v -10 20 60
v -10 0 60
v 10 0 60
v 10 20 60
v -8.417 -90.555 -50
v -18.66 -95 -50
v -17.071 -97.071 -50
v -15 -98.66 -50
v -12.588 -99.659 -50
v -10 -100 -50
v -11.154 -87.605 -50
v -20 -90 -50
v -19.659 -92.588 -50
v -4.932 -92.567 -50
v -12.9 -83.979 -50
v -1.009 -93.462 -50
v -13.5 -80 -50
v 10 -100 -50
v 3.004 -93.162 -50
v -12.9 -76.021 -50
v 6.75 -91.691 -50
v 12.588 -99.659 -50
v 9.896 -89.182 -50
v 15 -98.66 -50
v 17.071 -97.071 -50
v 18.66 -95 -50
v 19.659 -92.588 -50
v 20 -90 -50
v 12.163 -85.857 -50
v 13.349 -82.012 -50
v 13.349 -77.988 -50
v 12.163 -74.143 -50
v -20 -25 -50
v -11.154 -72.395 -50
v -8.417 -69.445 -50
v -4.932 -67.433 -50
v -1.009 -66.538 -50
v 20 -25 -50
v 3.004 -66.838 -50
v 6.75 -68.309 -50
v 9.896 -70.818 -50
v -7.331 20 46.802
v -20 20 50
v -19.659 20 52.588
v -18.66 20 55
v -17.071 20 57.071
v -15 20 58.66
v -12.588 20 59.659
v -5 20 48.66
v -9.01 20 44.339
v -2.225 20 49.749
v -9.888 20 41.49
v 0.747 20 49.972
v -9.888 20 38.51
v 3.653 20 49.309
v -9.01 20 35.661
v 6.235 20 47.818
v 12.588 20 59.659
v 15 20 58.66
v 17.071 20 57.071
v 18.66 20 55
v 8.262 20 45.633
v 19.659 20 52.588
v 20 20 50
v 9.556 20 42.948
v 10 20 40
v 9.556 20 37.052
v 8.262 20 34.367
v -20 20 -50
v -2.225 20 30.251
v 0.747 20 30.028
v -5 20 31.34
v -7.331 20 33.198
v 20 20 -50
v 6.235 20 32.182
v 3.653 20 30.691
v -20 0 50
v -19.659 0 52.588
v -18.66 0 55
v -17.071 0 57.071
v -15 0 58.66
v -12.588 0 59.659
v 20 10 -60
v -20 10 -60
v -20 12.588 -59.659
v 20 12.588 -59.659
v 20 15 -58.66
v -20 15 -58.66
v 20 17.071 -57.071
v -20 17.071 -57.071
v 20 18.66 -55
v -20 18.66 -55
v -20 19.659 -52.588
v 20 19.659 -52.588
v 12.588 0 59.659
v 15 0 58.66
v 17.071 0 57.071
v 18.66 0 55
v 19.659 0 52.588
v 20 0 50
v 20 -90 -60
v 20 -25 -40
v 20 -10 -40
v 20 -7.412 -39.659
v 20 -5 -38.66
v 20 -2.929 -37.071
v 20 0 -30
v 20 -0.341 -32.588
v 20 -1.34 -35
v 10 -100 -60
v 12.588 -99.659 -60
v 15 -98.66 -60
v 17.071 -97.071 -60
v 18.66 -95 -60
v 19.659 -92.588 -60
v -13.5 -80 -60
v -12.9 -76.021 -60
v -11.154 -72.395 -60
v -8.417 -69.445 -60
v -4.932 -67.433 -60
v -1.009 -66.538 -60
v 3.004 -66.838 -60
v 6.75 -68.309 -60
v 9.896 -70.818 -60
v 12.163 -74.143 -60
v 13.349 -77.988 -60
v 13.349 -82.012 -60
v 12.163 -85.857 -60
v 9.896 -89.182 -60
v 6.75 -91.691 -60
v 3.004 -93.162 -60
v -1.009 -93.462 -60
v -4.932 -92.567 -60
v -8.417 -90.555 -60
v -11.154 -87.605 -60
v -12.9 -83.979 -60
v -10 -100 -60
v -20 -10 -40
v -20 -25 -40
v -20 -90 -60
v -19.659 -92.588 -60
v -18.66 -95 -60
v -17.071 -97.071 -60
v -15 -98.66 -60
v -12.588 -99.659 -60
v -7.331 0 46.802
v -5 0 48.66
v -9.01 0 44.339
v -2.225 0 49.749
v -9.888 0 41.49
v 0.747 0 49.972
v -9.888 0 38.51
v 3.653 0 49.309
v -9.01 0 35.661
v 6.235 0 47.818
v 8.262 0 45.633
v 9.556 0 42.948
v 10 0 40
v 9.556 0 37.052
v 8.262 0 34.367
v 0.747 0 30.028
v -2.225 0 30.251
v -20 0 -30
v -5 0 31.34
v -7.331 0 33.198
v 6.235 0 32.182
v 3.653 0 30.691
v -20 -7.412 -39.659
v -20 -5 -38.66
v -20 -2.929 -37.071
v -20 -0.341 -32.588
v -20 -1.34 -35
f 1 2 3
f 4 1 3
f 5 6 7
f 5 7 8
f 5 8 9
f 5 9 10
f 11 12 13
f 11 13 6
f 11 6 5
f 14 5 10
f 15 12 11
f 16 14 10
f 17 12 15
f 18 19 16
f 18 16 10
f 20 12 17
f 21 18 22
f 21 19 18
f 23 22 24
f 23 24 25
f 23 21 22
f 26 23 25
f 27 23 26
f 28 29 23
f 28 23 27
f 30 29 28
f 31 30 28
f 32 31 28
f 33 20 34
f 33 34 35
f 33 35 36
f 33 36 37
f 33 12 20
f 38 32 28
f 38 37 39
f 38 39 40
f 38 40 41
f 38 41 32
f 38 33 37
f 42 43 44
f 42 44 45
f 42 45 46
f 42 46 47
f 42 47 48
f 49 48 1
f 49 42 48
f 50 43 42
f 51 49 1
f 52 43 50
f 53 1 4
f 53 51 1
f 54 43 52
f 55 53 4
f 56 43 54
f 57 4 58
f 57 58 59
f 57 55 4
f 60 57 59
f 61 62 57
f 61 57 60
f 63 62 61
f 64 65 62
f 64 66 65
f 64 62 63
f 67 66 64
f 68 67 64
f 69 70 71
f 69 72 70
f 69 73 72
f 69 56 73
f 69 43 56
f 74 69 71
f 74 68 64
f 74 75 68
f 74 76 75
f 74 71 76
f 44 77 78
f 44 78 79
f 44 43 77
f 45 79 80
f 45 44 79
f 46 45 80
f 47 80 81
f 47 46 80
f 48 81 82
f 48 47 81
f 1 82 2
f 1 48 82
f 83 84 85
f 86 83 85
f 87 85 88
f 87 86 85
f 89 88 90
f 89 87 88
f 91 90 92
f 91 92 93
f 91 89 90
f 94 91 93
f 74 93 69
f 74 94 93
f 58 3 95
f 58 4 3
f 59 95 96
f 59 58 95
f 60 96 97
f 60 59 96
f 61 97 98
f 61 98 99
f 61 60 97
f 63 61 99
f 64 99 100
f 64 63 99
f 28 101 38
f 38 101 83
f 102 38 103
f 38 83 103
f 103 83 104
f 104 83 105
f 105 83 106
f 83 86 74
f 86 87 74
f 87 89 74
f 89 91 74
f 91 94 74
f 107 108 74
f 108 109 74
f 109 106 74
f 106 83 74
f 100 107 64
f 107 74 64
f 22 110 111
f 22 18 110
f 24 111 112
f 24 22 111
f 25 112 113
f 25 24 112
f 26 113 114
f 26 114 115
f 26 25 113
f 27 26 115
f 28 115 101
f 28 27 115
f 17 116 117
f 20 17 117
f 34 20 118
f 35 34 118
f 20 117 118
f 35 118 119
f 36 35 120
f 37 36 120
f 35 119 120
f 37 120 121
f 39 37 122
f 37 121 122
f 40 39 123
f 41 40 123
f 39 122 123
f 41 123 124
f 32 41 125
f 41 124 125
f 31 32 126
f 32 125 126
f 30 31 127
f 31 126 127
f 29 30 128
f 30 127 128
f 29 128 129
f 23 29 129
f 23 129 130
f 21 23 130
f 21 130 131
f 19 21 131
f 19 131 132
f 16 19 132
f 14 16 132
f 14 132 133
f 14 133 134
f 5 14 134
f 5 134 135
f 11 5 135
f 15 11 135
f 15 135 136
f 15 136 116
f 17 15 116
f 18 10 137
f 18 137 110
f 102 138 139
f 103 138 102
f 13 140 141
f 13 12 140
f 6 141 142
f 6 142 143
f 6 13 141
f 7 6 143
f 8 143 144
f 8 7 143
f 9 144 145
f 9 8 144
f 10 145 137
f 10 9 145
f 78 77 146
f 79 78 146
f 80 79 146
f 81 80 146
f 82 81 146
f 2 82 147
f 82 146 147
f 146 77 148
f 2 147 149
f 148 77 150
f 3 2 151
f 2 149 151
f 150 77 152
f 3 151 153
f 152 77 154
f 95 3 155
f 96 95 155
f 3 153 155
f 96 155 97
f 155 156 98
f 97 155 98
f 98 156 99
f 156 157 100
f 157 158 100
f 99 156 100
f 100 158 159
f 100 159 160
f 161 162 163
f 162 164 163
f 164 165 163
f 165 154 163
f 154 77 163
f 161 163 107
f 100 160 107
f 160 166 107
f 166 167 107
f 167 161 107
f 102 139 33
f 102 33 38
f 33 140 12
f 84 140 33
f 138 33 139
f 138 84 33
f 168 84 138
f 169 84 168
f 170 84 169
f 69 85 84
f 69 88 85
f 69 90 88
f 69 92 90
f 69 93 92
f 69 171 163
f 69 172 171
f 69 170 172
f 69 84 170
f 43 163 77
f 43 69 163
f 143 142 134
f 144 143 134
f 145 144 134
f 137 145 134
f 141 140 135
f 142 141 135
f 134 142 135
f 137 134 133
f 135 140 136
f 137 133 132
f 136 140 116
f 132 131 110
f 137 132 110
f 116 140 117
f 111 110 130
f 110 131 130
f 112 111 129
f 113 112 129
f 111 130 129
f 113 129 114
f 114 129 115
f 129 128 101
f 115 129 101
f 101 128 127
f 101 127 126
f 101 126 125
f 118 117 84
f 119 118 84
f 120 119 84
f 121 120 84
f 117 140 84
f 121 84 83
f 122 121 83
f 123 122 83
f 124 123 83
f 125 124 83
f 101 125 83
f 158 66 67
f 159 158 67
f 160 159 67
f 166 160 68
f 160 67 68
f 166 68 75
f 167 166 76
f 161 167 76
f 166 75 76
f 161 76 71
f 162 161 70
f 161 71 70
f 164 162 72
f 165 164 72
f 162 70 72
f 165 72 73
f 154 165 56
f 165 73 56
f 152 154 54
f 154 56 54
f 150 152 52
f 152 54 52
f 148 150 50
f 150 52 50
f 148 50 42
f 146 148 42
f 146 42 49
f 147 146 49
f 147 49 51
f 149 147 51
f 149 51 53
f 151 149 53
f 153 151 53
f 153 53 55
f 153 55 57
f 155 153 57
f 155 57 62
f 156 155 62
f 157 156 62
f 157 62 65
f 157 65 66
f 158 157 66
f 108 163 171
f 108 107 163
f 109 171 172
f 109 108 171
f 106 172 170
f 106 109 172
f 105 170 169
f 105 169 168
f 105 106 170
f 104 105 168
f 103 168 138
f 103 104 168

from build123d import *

# Parameters (mm, degrees)
SKETCH1_W           = 40
SKETCH1_H           = 120
BOSS_EXTRUDE1_DEPTH = 20
SKETCH3_W           = 40
SKETCH3_H           = 20
BOSS_EXTRUDE3_DEPTH = 100
SKETCH4_W           = 40
SKETCH4_H           = 75
CUT_EXTRUDE1_DEPTH  = 10
FILLET1_R           = 10
CUT_EXTRUDE2_REACH  = 122
SKETCH5_R           = 13.5
CUT_EXTRUDE3_REACH  = 122
SKETCH6_R           = 10
FILLET2_R           = 10


with BuildPart() as part:
    # Sketch1 → Boss-Extrude1 (new body)
    with BuildSketch(Plane(origin=(0, 0, 0), x_dir=(1, 0, 0), z_dir=(0, 1, 0))):
        Rectangle(SKETCH1_W, SKETCH1_H)
    extrude(amount=BOSS_EXTRUDE1_DEPTH)

    # Sketch3 → Boss-Extrude3 (add)
    with BuildSketch(Plane.XZ):
        with Locations((0, -50)):
            Rectangle(SKETCH3_W, SKETCH3_H)
    extrude(amount=BOSS_EXTRUDE3_DEPTH)

    # Sketch4 → Cut-Extrude1 (cut)
    with BuildSketch(Plane.XY.offset(-40)):
        with Locations((0, -62.5)):
            Rectangle(SKETCH4_W, SKETCH4_H)
    extrude(amount=-CUT_EXTRUDE1_DEPTH, mode=Mode.SUBTRACT)

    # Fillet1
    fillet1_edges = [part.edges().sort_by_distance(p)[0] for p in [
        (20, 10, 60),
        (-20, 10, 60),
        (20, -100, -55),
        (-20, -100, -55),
        (0, 20, -60),
    ]]
    fillet(fillet1_edges, radius=FILLET1_R)

    # Sketch5 → Cut-Extrude2 (cut, up to next)
    with BuildSketch(Plane(origin=(0, 0, -60), x_dir=(-1, 0, 0), z_dir=(0, 0, -1)), mode=Mode.PRIVATE) as cut_extrude2_sk1:
        with Locations((0, -80)):
            Circle(SKETCH5_R)
    cut_extrude2_tool1 = extrude(cut_extrude2_sk1.sketch, amount=-CUT_EXTRUDE2_REACH, mode=Mode.PRIVATE) & part.part
    add(cut_extrude2_tool1.solids().sort_by_distance((0, -80, -60))[0], mode=Mode.SUBTRACT)

    # Sketch6 → Cut-Extrude3 (cut, up to next)
    with BuildSketch(Plane(origin=(0, 20, 0), x_dir=(1, 0, 0), z_dir=(0, 1, 0)), mode=Mode.PRIVATE) as cut_extrude3_sk1:
        with Locations((0, -40)):
            Circle(SKETCH6_R)
    cut_extrude3_tool1 = extrude(cut_extrude3_sk1.sketch, amount=-CUT_EXTRUDE3_REACH, mode=Mode.PRIVATE) & part.part
    add(cut_extrude3_tool1.solids().sort_by_distance((0, 20, 40))[0], mode=Mode.SUBTRACT)

    # Fillet2
    fillet2_edges = [part.edges().sort_by_distance(p)[0] for p in [
        (0, 0, -40),
    ]]
    fillet(fillet2_edges, radius=FILLET2_R)


solid = part.part
